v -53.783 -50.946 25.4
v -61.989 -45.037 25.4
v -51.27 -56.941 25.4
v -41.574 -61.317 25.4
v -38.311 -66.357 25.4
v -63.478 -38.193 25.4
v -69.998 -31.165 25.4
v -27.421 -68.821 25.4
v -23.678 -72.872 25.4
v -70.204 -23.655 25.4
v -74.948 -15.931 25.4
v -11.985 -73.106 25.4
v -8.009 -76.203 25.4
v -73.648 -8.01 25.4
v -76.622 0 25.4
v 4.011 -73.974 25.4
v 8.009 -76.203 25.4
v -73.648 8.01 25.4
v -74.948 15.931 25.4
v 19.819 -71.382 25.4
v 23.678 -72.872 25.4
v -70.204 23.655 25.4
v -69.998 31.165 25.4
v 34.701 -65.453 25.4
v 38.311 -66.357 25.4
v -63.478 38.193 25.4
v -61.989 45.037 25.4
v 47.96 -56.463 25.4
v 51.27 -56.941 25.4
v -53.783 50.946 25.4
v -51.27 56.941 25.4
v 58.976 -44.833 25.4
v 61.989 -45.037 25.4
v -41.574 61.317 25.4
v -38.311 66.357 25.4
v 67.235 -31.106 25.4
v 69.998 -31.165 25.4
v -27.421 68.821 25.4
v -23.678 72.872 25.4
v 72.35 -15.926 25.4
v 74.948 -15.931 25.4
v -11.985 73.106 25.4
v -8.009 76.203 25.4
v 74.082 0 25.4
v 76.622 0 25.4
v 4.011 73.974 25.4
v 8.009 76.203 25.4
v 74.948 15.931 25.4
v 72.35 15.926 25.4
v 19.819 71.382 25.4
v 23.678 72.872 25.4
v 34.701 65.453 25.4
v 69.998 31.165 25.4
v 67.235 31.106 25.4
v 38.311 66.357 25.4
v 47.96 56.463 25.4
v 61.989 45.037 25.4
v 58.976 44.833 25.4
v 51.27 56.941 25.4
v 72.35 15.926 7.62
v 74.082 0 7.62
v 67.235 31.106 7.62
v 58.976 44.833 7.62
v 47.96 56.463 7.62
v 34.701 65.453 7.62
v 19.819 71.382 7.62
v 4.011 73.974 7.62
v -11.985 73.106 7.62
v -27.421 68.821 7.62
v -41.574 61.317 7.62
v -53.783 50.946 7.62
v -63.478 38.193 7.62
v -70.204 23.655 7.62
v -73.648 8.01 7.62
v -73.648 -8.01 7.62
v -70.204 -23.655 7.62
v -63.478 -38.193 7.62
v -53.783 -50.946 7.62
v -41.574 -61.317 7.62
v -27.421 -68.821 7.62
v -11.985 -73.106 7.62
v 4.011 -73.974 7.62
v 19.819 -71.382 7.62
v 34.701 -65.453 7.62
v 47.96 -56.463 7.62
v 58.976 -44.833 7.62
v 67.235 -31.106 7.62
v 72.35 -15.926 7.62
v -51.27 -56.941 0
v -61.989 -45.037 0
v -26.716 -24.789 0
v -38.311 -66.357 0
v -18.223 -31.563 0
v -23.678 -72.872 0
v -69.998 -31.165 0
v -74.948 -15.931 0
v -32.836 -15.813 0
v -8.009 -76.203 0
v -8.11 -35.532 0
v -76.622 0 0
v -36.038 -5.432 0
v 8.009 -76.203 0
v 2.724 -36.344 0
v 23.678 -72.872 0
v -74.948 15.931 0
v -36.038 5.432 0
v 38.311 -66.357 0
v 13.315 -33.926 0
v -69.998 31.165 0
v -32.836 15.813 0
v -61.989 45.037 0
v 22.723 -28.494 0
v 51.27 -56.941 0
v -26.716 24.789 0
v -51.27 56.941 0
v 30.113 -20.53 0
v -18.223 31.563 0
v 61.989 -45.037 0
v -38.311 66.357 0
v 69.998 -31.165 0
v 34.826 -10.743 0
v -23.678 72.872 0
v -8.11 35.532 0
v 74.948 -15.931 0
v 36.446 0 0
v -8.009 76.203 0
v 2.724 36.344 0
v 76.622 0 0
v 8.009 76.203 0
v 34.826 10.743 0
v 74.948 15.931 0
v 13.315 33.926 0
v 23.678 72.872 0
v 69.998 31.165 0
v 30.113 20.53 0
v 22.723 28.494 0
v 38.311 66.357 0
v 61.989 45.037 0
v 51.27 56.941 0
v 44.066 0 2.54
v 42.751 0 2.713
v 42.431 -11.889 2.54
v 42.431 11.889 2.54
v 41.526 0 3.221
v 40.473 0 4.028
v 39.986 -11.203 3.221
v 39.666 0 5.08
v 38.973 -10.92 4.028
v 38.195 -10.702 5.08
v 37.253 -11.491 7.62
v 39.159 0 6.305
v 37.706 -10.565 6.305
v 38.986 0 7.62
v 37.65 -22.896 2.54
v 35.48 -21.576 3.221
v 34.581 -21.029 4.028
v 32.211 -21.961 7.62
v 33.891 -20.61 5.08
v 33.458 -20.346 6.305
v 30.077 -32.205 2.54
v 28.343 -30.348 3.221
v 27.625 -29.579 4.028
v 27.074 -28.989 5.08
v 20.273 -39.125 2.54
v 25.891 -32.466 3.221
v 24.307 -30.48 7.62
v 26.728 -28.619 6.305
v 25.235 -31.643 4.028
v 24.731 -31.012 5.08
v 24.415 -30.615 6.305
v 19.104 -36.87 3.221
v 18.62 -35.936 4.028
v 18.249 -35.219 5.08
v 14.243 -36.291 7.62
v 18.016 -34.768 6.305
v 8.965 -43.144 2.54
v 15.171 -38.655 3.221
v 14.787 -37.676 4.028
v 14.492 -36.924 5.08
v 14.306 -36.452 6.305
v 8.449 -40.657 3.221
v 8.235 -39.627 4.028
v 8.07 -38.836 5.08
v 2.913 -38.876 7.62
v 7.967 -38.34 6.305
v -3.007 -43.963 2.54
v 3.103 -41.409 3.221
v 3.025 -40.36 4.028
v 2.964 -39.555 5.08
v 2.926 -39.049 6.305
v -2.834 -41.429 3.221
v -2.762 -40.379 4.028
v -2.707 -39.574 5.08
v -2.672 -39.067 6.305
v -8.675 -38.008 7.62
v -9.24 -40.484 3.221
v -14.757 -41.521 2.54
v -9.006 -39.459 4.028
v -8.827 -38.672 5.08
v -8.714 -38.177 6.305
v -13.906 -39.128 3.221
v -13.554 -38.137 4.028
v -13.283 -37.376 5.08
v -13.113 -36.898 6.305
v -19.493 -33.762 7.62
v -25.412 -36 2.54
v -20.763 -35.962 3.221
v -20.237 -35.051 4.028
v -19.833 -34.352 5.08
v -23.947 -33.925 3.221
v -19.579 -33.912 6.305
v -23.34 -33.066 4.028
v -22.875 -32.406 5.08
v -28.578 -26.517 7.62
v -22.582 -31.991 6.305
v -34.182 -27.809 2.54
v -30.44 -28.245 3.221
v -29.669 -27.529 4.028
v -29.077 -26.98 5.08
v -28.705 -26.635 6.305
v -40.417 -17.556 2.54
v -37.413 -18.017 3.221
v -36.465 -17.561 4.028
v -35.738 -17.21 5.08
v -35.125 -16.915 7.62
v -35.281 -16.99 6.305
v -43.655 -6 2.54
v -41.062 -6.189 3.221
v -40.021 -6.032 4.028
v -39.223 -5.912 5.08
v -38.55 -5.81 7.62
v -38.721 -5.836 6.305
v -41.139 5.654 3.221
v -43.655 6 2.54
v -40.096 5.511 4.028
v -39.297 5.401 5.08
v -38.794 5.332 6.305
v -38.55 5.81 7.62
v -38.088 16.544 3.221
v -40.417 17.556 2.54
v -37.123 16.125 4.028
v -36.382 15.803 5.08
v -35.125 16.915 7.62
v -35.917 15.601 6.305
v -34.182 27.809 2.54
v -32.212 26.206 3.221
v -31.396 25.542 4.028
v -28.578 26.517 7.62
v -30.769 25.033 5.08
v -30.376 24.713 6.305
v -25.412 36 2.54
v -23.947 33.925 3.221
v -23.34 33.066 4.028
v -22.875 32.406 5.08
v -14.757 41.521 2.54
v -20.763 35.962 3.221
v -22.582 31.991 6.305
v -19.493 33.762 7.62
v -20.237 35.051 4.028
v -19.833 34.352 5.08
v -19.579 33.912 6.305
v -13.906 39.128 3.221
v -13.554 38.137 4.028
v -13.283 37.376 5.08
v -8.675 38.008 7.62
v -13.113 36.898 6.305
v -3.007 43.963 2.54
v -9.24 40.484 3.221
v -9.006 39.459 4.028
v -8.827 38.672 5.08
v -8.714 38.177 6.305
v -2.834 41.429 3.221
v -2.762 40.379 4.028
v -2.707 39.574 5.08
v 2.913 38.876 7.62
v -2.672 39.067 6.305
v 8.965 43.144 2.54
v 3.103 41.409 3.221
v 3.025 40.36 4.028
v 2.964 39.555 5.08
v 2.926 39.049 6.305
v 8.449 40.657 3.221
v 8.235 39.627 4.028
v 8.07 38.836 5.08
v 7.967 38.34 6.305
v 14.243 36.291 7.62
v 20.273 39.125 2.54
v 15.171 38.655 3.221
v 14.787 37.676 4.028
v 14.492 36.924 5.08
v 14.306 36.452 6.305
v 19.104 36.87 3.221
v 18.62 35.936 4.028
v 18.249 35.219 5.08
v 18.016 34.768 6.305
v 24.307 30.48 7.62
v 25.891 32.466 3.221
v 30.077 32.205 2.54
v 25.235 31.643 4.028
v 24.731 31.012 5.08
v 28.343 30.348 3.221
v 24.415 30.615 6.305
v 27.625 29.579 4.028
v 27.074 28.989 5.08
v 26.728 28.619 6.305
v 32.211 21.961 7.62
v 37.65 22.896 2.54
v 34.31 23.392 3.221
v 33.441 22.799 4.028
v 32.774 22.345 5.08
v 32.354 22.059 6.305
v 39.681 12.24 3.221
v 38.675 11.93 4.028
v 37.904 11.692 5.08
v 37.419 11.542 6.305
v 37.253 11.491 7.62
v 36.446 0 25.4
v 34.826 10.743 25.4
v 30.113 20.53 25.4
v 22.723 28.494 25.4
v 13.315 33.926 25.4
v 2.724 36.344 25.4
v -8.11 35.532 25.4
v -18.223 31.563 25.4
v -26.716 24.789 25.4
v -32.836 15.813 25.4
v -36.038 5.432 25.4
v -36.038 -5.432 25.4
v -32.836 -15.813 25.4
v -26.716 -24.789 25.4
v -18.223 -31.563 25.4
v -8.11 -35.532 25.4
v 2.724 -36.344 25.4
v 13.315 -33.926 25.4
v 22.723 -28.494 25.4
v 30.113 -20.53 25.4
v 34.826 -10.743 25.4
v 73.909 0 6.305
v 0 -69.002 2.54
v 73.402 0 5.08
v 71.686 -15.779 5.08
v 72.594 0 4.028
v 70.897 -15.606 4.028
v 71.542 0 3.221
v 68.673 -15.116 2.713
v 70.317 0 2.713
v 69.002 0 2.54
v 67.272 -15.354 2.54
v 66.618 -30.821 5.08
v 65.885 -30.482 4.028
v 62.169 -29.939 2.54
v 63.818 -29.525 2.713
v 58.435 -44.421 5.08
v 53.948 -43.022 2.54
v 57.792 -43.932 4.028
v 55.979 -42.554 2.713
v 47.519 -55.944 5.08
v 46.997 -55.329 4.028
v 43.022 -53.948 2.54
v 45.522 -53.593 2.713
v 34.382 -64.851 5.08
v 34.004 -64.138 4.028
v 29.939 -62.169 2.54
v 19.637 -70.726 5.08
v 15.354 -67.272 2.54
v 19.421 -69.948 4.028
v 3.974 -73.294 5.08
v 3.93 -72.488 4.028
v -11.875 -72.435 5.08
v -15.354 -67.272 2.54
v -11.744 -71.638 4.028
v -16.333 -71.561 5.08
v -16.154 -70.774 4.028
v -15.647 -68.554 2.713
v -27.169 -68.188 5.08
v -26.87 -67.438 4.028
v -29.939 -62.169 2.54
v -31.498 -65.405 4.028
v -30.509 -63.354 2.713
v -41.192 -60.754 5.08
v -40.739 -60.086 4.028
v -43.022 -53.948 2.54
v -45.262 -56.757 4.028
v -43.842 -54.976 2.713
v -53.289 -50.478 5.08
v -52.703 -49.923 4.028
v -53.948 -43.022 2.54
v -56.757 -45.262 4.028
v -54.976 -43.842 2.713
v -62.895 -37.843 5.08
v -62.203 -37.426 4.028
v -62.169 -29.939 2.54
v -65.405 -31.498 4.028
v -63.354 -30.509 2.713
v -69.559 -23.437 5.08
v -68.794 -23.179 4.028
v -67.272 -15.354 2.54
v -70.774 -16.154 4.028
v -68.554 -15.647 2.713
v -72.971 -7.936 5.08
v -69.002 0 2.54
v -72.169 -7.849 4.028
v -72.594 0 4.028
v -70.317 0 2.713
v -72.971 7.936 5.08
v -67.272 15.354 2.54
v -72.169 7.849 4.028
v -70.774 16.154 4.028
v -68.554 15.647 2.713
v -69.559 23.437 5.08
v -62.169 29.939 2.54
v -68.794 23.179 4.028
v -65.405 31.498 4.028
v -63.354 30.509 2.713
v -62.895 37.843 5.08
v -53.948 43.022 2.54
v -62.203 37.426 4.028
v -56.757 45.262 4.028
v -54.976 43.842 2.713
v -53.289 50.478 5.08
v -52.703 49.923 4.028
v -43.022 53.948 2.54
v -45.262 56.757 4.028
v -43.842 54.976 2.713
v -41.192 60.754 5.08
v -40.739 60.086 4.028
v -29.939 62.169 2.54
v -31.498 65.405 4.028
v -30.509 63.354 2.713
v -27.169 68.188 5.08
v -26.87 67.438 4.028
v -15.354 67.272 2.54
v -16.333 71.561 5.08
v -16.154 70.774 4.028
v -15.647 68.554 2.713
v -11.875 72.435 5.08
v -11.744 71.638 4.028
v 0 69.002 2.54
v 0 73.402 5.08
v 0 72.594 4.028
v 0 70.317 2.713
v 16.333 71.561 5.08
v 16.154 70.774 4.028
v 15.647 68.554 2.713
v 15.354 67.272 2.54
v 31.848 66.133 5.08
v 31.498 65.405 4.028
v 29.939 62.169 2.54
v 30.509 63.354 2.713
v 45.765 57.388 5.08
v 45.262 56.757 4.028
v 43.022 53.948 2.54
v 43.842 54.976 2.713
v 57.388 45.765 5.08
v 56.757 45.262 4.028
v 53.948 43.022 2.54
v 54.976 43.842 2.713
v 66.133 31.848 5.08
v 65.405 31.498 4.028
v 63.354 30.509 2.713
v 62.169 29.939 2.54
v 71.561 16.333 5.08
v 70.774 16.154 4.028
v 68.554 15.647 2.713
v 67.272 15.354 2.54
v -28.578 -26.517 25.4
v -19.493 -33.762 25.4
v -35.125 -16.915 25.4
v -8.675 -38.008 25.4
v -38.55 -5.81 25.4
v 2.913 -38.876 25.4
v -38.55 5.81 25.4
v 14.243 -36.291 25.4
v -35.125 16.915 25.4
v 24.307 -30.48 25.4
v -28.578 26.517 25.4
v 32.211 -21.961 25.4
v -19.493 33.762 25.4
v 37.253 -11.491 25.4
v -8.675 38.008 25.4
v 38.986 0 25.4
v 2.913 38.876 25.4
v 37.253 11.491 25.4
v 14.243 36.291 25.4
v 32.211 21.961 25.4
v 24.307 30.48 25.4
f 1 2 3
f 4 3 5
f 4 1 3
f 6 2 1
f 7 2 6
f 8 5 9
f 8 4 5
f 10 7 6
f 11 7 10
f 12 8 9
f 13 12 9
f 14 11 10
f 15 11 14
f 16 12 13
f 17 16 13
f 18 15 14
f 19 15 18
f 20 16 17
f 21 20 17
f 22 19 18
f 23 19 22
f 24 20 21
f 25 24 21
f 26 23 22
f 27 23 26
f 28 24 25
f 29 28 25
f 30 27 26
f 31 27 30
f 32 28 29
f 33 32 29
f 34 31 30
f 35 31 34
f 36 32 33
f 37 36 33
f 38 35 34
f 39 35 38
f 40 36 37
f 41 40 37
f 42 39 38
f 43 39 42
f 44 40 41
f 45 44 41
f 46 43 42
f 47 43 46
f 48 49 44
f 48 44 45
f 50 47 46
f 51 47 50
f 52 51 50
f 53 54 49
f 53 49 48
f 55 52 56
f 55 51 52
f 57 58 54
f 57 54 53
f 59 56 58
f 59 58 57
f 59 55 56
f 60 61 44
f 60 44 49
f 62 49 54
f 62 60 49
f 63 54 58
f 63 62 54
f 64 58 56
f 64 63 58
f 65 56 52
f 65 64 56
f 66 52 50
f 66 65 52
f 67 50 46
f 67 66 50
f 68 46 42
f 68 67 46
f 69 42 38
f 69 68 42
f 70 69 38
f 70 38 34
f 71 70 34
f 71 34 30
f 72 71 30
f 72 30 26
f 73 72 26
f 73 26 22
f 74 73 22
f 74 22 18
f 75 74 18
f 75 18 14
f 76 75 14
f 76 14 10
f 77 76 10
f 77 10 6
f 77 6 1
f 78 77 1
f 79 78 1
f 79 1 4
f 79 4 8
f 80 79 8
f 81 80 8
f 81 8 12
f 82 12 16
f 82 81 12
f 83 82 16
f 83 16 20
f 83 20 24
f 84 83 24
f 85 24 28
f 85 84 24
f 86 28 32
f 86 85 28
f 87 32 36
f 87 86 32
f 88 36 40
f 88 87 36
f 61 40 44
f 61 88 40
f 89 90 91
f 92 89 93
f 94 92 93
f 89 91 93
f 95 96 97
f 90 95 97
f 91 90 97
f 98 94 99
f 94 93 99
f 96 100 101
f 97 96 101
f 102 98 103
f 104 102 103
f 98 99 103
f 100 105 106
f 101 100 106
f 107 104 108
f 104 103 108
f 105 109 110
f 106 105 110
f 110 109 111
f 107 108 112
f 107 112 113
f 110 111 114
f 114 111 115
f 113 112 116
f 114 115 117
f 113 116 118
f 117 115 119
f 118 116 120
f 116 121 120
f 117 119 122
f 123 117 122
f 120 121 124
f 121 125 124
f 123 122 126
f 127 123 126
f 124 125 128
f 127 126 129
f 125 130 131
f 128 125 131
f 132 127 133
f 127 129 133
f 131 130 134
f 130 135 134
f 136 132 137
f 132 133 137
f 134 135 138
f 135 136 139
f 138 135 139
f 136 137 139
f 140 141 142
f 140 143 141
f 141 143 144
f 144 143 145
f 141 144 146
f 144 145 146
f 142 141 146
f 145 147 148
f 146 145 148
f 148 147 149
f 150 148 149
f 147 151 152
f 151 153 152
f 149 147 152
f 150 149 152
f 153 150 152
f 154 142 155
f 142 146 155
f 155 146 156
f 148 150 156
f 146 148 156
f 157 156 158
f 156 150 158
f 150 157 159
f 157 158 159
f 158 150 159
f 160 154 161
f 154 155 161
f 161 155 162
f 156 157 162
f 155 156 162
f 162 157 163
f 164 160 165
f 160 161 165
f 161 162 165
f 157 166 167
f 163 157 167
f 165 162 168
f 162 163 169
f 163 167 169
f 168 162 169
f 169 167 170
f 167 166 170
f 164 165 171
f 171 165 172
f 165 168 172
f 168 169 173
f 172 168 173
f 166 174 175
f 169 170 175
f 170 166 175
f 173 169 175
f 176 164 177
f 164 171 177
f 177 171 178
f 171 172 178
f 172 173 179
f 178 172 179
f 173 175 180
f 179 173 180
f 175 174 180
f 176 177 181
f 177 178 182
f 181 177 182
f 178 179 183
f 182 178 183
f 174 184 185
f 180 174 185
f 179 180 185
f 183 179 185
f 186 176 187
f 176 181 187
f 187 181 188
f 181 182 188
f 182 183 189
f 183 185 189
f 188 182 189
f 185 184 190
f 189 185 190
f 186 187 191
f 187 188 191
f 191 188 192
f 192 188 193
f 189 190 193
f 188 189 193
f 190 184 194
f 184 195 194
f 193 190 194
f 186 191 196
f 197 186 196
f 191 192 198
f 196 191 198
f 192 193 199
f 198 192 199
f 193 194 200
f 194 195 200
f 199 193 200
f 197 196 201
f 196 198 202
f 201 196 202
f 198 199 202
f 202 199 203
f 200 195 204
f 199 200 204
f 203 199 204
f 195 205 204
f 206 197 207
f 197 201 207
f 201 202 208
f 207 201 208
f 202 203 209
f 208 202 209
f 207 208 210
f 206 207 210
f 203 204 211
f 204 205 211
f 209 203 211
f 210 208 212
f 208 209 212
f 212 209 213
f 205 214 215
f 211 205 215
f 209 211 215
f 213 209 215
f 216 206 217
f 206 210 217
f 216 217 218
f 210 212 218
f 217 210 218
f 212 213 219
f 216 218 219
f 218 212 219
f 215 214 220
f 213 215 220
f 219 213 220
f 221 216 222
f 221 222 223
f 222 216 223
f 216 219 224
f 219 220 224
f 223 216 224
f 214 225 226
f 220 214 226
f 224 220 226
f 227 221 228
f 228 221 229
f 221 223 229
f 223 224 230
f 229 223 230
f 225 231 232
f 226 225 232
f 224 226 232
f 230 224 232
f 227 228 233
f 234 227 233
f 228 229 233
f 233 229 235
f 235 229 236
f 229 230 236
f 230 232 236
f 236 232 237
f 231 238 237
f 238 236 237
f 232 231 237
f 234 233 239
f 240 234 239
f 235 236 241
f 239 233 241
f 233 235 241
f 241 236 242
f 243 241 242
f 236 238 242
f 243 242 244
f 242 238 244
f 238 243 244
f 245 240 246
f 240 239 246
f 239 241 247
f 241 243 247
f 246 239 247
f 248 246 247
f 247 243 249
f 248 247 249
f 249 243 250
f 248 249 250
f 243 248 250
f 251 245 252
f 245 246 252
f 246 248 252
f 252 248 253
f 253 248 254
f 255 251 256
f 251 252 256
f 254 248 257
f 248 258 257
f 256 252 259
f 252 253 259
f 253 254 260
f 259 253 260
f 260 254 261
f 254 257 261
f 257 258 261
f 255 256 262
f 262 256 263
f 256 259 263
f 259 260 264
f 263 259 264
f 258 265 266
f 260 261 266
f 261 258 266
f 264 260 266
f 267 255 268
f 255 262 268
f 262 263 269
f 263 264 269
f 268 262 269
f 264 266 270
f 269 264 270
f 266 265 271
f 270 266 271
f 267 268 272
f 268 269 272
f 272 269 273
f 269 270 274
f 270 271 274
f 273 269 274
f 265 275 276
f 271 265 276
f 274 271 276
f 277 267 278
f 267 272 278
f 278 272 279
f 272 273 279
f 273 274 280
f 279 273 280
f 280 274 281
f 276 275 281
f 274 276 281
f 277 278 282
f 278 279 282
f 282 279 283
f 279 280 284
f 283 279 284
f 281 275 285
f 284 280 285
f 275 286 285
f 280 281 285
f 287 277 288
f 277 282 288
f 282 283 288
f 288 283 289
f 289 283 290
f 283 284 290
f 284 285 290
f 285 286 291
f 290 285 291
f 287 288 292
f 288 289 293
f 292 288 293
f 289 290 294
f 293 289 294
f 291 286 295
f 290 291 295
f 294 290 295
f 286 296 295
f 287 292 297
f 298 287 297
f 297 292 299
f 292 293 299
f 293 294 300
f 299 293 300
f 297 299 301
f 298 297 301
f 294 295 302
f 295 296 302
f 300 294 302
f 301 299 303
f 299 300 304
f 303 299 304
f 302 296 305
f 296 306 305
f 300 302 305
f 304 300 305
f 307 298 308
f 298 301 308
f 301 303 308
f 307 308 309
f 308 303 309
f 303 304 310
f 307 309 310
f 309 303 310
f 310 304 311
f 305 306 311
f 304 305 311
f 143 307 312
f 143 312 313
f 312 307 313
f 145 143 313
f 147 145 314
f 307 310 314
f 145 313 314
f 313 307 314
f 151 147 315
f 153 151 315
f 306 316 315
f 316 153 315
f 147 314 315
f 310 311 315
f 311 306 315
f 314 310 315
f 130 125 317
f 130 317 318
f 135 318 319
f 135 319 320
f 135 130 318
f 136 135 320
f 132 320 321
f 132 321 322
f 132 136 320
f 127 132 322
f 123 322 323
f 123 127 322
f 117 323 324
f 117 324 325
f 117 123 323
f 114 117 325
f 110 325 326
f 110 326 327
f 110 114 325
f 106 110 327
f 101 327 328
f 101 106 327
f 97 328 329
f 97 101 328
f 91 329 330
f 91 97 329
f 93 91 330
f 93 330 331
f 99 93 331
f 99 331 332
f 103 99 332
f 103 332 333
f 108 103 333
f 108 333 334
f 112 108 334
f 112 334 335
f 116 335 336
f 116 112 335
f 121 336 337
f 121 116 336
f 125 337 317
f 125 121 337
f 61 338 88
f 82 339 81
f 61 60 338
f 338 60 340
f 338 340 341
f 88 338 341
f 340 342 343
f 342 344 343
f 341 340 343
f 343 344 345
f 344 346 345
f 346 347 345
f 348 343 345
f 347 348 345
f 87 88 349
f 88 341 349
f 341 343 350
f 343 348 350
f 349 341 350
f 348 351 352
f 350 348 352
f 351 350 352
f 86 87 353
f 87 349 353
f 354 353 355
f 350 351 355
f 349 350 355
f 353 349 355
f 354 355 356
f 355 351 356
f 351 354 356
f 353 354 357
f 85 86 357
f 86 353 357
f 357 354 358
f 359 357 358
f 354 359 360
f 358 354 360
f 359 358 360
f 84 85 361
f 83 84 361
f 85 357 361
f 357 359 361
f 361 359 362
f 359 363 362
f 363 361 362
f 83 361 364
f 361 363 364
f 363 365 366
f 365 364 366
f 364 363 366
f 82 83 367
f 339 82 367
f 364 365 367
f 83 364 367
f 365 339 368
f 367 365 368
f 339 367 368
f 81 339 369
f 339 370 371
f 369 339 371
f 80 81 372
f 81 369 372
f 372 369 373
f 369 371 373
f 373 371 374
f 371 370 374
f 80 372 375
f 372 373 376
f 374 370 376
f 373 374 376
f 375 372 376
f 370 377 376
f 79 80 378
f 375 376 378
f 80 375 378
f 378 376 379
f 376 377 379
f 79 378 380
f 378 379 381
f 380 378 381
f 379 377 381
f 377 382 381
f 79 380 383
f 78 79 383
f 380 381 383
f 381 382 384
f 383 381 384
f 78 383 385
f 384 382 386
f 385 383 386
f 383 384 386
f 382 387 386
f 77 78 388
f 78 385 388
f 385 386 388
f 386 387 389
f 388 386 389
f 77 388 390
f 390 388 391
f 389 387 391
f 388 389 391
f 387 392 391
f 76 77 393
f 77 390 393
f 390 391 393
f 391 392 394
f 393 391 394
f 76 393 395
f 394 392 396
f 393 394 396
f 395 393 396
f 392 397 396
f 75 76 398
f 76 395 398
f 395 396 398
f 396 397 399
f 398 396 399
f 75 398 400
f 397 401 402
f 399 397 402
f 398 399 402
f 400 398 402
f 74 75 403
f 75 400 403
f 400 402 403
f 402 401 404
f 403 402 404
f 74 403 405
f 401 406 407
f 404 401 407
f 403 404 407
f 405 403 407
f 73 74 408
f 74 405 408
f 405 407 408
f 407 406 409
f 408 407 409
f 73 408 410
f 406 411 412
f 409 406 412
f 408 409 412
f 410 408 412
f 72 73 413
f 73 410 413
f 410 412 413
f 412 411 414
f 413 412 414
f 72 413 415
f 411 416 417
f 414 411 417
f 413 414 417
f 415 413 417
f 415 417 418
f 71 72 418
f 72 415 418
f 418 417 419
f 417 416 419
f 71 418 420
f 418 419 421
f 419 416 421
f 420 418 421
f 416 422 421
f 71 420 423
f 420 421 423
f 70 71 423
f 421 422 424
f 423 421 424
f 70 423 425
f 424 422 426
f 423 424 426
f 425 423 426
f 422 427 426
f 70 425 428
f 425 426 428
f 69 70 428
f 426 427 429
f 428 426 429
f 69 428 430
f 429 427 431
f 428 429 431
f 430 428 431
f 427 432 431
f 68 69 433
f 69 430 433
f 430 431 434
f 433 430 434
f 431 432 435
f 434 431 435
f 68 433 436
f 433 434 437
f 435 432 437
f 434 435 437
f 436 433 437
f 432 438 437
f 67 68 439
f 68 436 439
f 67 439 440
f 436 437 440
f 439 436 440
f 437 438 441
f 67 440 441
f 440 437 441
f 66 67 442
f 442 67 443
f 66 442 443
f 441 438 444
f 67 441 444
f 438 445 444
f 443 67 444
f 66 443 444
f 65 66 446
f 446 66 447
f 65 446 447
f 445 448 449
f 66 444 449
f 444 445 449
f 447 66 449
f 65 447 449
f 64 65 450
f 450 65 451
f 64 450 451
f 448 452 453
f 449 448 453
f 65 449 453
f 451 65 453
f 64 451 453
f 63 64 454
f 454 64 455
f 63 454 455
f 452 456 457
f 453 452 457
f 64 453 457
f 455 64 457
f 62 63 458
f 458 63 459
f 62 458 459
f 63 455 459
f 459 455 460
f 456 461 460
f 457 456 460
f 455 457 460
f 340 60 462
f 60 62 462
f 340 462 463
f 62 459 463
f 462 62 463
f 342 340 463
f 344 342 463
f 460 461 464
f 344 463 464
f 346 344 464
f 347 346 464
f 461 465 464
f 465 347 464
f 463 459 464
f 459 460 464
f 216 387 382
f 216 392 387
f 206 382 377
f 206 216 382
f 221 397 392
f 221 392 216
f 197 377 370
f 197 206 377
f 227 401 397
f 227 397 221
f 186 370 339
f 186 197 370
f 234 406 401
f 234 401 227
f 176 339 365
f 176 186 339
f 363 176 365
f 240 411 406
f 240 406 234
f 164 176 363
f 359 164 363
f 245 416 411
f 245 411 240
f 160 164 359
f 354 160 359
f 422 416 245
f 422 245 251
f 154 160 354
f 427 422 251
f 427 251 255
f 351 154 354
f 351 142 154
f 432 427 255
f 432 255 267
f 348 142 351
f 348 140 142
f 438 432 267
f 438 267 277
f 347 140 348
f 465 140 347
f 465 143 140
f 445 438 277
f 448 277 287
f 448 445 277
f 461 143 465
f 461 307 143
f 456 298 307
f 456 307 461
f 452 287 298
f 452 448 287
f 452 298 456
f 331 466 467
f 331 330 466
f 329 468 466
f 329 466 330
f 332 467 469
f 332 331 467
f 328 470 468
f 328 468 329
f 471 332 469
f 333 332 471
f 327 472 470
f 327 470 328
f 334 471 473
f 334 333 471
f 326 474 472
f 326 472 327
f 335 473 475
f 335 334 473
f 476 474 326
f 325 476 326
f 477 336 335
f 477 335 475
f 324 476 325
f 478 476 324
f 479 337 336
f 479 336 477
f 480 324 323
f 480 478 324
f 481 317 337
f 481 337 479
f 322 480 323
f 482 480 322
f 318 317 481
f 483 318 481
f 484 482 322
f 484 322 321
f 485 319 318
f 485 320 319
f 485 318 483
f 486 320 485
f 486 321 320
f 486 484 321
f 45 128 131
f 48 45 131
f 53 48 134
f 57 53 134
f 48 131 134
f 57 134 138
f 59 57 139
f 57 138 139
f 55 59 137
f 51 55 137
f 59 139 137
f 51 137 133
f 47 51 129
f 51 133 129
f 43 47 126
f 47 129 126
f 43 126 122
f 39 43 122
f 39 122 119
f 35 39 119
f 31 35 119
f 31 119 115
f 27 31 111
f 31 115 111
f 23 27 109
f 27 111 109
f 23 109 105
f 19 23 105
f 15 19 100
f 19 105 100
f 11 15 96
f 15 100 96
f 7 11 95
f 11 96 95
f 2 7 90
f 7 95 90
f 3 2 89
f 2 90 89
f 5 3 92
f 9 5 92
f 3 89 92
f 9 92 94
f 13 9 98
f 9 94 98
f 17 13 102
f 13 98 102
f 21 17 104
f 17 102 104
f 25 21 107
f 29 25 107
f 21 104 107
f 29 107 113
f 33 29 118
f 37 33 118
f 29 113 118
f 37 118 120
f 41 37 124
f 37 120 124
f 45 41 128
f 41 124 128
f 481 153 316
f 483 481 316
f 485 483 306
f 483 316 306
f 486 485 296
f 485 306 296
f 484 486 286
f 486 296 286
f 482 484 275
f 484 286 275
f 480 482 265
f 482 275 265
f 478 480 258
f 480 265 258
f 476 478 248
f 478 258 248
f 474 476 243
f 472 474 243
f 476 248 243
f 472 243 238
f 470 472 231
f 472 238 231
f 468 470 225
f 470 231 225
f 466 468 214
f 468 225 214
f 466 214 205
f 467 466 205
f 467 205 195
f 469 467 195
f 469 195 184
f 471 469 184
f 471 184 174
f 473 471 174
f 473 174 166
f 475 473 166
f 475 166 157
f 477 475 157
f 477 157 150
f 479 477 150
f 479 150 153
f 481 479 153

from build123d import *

# Parameters (mm, degrees)
F0_R     = 76.6222869854
F0_R_2   = 36.4455054166
F1_DEPTH = 25.4
F2_T     = -2.54
F3_R     = 5.08


with BuildPart() as f1:
    # F0 (on Top) → F1 (new body)
    with BuildSketch(Plane.XY):
        Circle(F0_R)
        Circle(F0_R_2, mode=Mode.SUBTRACT)
    extrude(amount=F1_DEPTH)

    # F2
    f2_openings = [f1.faces().sort_by_distance(p)[0] for p in [
        (-74.455081, 0, 25.4),
    ]]
    offset(amount=F2_T, openings=f2_openings)

    # F3
    f3_edges = [f1.edges().sort_by_distance(p)[0] for p in [
        (-74.082287, 0, 2.54),
        (-38.985505, 0, 2.54),
    ]]
    fillet(f3_edges, radius=F3_R)


solid = f1.part
